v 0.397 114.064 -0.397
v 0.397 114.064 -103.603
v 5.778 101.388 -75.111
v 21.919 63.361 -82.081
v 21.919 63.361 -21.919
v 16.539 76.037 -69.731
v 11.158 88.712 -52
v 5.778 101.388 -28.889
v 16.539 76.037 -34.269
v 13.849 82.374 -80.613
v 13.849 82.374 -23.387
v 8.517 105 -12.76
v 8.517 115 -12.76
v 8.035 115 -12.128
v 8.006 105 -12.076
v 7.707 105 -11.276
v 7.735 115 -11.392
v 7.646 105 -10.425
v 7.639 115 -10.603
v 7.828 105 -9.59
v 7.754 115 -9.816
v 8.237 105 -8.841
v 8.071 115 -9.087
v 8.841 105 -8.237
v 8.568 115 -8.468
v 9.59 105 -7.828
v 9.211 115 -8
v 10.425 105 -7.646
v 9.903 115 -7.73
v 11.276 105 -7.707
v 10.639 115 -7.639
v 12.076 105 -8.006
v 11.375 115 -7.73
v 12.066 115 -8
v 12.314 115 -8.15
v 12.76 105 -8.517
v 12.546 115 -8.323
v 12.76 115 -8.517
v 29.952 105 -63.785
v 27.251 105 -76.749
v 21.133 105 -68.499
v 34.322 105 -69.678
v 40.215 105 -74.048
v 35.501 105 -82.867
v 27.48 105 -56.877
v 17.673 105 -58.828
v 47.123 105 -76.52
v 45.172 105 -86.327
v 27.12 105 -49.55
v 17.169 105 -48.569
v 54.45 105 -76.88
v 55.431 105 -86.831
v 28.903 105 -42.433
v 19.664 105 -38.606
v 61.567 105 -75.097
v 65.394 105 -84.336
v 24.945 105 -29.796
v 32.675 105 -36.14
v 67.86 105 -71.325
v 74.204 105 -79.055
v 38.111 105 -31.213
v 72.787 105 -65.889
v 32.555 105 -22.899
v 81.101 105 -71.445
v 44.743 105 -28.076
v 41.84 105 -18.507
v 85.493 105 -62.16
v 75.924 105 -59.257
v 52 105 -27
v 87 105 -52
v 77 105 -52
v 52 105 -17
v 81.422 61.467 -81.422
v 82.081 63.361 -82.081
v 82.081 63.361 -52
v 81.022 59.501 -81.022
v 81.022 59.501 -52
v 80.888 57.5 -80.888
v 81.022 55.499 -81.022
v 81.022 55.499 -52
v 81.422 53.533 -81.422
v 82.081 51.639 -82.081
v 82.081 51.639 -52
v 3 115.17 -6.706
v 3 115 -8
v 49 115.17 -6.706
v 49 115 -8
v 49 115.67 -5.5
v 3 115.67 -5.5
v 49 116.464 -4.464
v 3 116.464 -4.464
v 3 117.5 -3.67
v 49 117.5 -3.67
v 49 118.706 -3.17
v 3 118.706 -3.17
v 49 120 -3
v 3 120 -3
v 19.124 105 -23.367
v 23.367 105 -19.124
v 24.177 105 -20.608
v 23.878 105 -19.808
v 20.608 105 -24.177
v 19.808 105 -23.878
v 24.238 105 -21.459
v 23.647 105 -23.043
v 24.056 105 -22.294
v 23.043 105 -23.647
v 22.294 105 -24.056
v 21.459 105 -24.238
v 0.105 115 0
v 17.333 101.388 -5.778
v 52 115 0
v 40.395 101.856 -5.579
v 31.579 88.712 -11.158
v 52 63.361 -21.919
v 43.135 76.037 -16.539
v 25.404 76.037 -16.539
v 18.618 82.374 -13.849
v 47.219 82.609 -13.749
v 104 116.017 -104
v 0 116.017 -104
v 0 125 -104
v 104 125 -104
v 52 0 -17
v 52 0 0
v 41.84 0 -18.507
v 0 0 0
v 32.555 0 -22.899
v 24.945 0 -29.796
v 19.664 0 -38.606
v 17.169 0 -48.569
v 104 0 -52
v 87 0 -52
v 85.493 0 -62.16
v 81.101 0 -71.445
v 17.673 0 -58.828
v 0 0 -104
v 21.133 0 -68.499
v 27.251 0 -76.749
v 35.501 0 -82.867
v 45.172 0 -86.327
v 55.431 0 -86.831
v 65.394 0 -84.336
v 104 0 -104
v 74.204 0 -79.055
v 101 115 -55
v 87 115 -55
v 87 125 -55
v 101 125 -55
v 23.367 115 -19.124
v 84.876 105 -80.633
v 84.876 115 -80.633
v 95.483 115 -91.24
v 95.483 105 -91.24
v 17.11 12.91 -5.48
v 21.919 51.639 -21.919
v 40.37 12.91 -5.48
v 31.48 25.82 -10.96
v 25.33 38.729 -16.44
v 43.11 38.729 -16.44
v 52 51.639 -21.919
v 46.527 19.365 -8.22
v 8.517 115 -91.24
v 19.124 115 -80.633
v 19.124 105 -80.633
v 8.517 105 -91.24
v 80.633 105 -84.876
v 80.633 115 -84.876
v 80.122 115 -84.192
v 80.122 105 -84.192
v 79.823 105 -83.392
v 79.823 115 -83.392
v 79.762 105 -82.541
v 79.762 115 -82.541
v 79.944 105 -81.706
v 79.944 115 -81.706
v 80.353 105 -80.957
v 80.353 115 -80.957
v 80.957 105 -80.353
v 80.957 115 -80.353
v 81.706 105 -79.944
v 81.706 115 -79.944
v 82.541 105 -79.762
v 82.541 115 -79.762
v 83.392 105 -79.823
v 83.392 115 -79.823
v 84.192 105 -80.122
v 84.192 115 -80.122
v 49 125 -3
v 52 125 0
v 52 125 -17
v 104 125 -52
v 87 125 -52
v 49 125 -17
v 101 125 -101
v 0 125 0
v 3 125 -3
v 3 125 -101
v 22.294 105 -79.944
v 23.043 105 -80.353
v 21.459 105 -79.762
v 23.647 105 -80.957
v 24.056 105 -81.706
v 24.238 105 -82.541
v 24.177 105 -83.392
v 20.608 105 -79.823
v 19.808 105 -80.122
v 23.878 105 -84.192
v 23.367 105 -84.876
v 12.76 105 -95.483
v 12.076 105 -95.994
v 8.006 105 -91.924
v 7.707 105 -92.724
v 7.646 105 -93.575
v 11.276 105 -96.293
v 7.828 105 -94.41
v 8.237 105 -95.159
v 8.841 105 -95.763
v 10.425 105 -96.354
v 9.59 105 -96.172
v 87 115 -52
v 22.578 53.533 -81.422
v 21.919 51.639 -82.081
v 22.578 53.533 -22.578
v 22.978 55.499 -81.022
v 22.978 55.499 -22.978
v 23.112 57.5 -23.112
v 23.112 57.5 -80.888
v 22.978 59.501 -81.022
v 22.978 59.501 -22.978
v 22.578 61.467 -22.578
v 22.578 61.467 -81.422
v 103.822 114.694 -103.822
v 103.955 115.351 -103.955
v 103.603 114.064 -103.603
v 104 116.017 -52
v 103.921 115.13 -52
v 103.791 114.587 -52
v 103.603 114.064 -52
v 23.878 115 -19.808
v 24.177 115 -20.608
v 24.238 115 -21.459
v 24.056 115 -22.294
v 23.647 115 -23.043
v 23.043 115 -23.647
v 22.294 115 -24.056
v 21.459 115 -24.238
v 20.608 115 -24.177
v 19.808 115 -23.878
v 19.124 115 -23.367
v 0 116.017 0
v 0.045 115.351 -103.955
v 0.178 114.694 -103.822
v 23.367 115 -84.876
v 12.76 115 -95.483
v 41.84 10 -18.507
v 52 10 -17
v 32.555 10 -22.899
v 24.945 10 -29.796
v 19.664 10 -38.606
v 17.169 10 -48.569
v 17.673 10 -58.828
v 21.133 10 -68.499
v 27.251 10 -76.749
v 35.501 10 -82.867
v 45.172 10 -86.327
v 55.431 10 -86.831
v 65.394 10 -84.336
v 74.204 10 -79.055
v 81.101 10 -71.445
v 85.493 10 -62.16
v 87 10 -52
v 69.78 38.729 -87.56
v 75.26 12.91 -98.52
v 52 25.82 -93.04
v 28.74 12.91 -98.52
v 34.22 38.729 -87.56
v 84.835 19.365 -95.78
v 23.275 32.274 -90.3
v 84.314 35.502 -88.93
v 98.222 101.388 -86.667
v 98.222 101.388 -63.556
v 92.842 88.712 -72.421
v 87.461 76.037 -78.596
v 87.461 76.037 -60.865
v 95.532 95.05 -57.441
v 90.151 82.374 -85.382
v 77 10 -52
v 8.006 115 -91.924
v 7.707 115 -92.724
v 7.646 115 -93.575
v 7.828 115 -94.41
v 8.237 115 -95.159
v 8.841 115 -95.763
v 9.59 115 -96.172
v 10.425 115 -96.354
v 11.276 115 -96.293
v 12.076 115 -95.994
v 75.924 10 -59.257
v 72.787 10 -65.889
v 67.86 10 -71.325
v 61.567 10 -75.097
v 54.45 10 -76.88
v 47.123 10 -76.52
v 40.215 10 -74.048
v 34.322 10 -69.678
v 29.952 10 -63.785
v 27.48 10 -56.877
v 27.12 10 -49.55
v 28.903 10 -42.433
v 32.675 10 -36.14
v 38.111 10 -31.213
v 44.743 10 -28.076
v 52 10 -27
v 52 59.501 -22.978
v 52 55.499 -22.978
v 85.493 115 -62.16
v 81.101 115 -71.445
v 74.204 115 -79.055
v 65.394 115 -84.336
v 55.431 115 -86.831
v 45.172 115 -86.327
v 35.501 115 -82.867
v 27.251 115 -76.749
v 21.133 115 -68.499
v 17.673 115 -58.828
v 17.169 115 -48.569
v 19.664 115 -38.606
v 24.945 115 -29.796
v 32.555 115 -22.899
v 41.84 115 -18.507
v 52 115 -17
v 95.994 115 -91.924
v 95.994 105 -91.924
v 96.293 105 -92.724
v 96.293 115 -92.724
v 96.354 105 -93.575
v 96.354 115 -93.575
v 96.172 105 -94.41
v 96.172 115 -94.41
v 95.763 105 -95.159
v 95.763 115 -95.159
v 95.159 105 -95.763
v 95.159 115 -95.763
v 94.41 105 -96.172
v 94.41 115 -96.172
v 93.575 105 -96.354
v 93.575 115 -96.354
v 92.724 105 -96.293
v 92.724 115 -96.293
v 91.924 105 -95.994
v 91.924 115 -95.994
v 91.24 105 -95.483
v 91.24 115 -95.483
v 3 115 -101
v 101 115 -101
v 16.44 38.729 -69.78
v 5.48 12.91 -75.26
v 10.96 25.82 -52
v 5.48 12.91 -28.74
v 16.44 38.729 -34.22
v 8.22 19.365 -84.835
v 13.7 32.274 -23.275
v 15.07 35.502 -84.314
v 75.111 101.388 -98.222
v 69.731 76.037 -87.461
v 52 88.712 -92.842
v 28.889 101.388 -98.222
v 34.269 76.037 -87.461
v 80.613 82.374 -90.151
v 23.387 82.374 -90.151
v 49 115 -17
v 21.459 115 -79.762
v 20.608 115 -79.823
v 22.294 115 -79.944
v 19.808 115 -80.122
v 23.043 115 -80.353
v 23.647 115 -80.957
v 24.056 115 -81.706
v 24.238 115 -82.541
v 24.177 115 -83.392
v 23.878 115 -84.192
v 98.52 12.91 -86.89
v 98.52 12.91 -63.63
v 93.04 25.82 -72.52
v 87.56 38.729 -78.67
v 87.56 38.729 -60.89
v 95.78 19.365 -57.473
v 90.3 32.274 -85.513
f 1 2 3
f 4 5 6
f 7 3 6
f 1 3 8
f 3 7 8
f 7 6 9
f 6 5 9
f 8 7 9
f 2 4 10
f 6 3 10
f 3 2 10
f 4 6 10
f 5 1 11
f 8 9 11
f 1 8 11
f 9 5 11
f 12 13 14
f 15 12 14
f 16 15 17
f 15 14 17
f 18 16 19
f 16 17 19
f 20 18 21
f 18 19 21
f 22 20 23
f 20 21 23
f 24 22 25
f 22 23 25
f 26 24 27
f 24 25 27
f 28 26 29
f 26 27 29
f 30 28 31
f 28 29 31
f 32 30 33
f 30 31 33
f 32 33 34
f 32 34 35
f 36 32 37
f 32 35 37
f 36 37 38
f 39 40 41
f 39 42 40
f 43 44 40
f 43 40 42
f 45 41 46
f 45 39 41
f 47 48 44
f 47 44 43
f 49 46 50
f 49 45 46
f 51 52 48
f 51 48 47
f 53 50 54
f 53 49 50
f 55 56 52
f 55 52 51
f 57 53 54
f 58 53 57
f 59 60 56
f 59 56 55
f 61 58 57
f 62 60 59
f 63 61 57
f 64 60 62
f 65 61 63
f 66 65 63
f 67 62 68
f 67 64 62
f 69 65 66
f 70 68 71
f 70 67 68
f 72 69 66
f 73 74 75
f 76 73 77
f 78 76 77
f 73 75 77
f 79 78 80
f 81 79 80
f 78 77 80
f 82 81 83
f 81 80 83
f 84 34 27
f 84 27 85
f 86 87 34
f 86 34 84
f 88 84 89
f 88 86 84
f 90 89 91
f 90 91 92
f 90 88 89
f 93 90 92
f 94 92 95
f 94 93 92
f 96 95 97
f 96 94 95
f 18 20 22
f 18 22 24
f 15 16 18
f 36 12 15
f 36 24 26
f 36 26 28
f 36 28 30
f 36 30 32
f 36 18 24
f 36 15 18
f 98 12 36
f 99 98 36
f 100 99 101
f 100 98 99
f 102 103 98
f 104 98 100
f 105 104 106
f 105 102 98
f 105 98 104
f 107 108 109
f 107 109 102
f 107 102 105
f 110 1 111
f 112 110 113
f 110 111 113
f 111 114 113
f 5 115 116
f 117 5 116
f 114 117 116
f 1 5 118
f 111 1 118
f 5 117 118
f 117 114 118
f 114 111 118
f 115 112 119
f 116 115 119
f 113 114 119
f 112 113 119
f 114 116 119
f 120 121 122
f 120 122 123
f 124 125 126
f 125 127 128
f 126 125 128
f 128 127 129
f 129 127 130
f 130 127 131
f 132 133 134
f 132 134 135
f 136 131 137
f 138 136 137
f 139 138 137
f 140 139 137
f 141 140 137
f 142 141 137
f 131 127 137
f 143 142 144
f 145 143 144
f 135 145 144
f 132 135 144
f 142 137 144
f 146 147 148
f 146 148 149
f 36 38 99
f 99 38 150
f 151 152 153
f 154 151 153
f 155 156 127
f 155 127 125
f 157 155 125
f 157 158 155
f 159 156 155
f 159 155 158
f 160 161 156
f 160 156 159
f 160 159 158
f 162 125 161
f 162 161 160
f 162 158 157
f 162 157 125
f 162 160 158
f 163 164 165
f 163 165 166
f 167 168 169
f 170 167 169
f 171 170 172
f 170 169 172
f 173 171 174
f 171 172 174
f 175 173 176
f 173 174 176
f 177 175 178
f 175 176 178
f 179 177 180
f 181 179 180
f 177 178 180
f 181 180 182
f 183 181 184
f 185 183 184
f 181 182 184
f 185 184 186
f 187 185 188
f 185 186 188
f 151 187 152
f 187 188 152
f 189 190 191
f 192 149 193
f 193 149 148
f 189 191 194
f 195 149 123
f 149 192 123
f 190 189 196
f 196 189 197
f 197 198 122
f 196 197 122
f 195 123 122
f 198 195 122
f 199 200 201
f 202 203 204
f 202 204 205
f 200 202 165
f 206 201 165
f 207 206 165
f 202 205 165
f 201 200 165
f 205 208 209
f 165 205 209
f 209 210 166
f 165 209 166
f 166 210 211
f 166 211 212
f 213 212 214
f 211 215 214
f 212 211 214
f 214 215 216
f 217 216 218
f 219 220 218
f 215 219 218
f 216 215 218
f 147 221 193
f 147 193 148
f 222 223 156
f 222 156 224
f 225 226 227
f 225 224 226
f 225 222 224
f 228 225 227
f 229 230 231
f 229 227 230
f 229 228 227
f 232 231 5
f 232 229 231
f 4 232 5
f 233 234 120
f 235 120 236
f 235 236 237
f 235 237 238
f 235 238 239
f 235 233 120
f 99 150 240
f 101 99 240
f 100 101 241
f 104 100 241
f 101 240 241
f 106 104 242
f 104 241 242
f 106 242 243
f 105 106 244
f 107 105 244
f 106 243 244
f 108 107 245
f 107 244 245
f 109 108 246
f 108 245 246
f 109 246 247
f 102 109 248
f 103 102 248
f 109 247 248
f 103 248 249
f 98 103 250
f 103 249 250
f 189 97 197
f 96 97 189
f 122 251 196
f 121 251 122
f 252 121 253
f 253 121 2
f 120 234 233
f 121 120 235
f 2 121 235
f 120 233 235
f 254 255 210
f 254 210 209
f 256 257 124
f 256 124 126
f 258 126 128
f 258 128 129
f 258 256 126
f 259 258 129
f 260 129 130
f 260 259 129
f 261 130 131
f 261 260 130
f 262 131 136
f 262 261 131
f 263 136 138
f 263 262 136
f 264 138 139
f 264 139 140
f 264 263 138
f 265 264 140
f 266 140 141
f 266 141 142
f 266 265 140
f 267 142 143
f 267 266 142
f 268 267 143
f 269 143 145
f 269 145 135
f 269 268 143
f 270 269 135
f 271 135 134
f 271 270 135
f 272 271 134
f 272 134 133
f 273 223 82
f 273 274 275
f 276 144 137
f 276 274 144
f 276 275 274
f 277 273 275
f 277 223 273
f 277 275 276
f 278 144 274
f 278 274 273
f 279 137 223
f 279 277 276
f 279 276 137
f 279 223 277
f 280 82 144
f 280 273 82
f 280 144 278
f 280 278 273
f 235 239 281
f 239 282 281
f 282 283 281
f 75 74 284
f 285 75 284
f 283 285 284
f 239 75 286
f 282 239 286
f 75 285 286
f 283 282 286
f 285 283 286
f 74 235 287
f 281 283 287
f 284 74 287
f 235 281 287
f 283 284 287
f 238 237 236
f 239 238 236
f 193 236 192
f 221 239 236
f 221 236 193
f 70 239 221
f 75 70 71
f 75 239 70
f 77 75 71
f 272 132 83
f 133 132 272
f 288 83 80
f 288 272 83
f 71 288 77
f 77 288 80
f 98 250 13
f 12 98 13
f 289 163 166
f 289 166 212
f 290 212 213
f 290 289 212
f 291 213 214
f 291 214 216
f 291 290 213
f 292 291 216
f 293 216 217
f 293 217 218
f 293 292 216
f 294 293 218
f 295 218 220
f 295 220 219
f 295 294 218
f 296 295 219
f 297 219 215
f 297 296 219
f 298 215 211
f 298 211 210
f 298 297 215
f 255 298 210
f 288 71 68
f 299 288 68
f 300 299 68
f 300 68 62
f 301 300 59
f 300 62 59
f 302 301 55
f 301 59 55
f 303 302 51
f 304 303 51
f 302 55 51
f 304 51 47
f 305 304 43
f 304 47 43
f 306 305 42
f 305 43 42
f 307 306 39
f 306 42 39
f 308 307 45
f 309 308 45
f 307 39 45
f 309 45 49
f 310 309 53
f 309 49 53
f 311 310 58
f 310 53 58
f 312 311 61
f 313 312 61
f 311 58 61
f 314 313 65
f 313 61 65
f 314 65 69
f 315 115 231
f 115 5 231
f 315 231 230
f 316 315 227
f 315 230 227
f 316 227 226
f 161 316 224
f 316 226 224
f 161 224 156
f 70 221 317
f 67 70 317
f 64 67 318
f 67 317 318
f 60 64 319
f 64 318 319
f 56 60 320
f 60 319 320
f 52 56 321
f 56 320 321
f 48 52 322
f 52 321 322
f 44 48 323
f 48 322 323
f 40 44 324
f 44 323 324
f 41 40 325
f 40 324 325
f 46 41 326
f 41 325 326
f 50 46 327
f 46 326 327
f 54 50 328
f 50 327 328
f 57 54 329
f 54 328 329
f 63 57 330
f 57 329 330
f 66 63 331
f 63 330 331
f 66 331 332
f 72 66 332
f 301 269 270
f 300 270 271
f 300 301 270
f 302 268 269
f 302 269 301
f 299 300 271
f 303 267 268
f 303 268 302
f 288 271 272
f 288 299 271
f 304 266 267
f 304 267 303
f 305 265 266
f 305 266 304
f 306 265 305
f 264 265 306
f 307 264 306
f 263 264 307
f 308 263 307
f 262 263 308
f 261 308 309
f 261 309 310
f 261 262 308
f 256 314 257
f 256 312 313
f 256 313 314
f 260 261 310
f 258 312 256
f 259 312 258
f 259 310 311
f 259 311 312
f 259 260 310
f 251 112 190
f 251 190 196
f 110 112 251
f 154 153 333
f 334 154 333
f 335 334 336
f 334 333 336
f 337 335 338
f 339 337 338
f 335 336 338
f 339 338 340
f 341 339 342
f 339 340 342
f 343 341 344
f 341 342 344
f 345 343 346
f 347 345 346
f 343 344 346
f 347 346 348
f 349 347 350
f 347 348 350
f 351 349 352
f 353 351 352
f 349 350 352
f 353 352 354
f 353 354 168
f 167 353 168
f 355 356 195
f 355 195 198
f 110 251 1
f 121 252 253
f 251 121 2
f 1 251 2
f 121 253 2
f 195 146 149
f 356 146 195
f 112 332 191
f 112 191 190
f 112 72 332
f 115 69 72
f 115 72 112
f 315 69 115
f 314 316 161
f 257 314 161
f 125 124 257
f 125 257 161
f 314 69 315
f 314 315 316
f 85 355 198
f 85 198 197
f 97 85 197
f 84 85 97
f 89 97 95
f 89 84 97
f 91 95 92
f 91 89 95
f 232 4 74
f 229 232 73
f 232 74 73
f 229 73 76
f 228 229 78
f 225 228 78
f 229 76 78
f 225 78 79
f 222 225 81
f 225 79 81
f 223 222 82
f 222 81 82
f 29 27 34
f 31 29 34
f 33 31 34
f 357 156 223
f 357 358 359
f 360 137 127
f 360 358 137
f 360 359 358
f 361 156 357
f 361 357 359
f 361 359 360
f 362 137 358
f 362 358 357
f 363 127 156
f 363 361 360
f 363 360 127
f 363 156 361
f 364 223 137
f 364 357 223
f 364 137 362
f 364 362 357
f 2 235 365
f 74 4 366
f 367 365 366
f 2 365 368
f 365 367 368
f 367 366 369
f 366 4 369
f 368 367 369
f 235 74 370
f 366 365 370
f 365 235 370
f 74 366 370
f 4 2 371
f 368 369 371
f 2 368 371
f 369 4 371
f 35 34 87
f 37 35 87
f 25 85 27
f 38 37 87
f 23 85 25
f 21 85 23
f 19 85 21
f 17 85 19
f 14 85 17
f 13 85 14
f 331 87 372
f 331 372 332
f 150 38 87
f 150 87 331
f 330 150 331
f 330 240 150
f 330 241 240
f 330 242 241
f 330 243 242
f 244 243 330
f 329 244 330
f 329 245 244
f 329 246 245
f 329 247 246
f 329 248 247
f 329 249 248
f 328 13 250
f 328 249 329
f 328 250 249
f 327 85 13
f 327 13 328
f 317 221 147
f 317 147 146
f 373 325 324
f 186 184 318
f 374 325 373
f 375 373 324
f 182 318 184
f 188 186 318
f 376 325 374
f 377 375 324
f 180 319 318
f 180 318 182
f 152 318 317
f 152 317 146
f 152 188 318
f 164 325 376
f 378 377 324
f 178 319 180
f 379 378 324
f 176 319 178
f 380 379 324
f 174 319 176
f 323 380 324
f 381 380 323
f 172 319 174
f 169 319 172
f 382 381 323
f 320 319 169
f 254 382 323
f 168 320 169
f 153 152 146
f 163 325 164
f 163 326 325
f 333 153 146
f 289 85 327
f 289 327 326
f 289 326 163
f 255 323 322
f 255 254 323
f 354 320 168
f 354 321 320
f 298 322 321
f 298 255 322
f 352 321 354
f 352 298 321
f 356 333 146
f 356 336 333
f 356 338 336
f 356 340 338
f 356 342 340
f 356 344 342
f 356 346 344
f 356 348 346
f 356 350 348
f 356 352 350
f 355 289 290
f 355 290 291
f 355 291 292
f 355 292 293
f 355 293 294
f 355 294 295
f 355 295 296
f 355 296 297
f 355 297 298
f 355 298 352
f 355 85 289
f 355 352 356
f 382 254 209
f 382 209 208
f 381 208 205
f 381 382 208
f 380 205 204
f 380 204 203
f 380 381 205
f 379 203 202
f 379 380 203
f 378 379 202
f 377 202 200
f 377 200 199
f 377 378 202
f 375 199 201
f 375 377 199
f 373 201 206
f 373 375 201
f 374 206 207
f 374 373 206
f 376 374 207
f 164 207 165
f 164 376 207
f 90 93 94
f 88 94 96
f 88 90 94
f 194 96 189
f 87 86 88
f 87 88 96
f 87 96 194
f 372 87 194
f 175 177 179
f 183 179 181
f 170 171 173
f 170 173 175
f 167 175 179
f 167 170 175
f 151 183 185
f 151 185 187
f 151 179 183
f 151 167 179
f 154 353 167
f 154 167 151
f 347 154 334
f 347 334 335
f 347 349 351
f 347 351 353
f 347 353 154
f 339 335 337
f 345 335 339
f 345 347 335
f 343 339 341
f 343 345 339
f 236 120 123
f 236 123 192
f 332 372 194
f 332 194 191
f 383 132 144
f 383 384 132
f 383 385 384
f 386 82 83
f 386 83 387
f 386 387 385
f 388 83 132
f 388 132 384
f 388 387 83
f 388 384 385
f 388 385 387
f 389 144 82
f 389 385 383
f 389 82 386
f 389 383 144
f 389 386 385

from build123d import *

# Parameters (mm, degrees)
SKETCH1_W           = 104
SKETCH1_H           = 104
BOSS_EXTRUDE1_DEPTH = 57.5
BOSS_EXTRUDE1_TAPER = 23
SKETCH2_R           = 25
CUT_EXTRUDE1_DEPTH  = 187.700294763
FILLET1_R           = 15
SKETCH3_R           = 35
CUT_EXTRUDE2_DEPTH  = 10
CUT_EXTRUDE3_START  = -10
SKETCH5_R           = 35
CUT_EXTRUDE3_DEPTH  = 10
SKETCH6_W           = 52
SKETCH6_H           = 52
CUT_EXTRUDE4_DEPTH  = 187.700294763
BOSS_EXTRUDE2_DEPTH = 10
FILLET2_R           = 5
CUT_EXTRUDE5_DEPTH  = 10


with BuildPart() as part:
    # Sketch1 → Boss-Extrude1 (new body)
    with BuildSketch(Plane(origin=(0, 0, 0), x_dir=(1, 0, 0), z_dir=(0, 1, 0))):
        with Locations((52, 52)):
            Rectangle(SKETCH1_W, SKETCH1_H)
    extrude(amount=BOSS_EXTRUDE1_DEPTH, taper=BOSS_EXTRUDE1_TAPER)

    # Mirror1: part across plane


with BuildPart() as part_1:
    add(part.part)
    add(part.part.mirror(Plane(origin=(0, 57.5, 0), x_dir=(0, 0, 1), z_dir=(0, -1, 0))))

    # Sketch2 → Cut-Extrude1 (cut, through all)
    with BuildSketch(Plane(origin=(0, 115, 0), x_dir=(1, 0, 0), z_dir=(0, 1, 0))):
        with Locations(Location((52, 52, 0), (0, 0, 270))):
            Circle(SKETCH2_R)
    extrude(amount=-CUT_EXTRUDE1_DEPTH, mode=Mode.SUBTRACT)

    # Fillet1
    # the kernel refuses this fillet: 15 mm, written as the material it adds along each edge
    with BuildSketch(Plane(origin=(24.407301932, 57.5, -95.510503676), x_dir=(-0.39073112848927455, -0.9205048534524399, 0), z_dir=(0, 0, 1))) as fillet1_piece_1_section:
        with BuildLine():
            CenterArc((FILLET1_R * 0.42447481621, -FILLET1_R), FILLET1_R, 90, 46)
            Line((-FILLET1_R * 0.294864984129, -FILLET1_R * 0.305341629541), (0, 0))
            Line((0, 0), (FILLET1_R * 0.42447481621, 0))
        make_face()
    fillet1_piece_1 = extrude(amount=87.021007352, mode=Mode.PRIVATE)
    fillet1_piece_1 = fillet1_piece_1 - Plane(origin=(24.407301932, 57.5, -8.111896271), x_dir=(0, -0.39073112848927466, -0.9205048534524399), z_dir=(-1, 0, 0)) * Cylinder(15, 200, mode=Mode.PRIVATE)
    fillet1_piece_1 = fillet1_piece_1 - Plane(origin=(24.407301932, 57.5, -95.888103729), x_dir=(0, -0.3907311284892748, 0.9205048534524398), z_dir=(1, 0, 0)) * Cylinder(15, 200, mode=Mode.PRIVATE)
    add(fillet1_piece_1)
    with BuildSketch(Plane(origin=(8.489496324, 57.5, -24.407301932), x_dir=(0, -0.9205048534524399, 0.39073112848927455), z_dir=(1, 0, 0))) as fillet1_piece_2_section:
        with BuildLine():
            CenterArc((FILLET1_R * 0.42447481621, -FILLET1_R), FILLET1_R, 90, 46)
            Line((-FILLET1_R * 0.294864984129, -FILLET1_R * 0.305341629541), (0, 0))
            Line((0, 0), (FILLET1_R * 0.42447481621, 0))
        make_face()
    fillet1_piece_2 = extrude(amount=87.021007352, mode=Mode.PRIVATE)
    fillet1_piece_2 = fillet1_piece_2 - Plane(origin=(95.888103729, 57.5, -24.407301932), x_dir=(-0.9205048534524398, -0.3907311284892748, 0), z_dir=(0, 0, 1)) * Cylinder(15, 200, mode=Mode.PRIVATE)
    fillet1_piece_2 = fillet1_piece_2 - Plane(origin=(8.111896271, 57.5, -24.407301932), x_dir=(0.9205048534524399, -0.39073112848927466, 0), z_dir=(0, 0, -1)) * Cylinder(15, 200, mode=Mode.PRIVATE)
    add(fillet1_piece_2)
    with BuildSketch(Plane(origin=(79.592698068, 57.5, -8.489496324), x_dir=(0.39073112848927455, -0.9205048534524399, 0), z_dir=(0, 0, -1))) as fillet1_piece_3_section:
        with BuildLine():
            CenterArc((FILLET1_R * 0.42447481621, -FILLET1_R), FILLET1_R, 90, 46)
            Line((-FILLET1_R * 0.294864984129, -FILLET1_R * 0.305341629541), (0, 0))
            Line((0, 0), (FILLET1_R * 0.42447481621, 0))
        make_face()
    fillet1_piece_3 = extrude(amount=87.021007352, mode=Mode.PRIVATE)
    fillet1_piece_3 = fillet1_piece_3 - Plane(origin=(79.592698068, 57.5, -8.111896271), x_dir=(0, -0.39073112848927466, -0.9205048534524399), z_dir=(-1, 0, 0)) * Cylinder(15, 200, mode=Mode.PRIVATE)
    fillet1_piece_3 = fillet1_piece_3 - Plane(origin=(79.592698068, 57.5, -95.888103729), x_dir=(0, -0.3907311284892748, 0.9205048534524398), z_dir=(1, 0, 0)) * Cylinder(15, 200, mode=Mode.PRIVATE)
    add(fillet1_piece_3)
    with BuildSketch(Plane(origin=(95.510503676, 57.5, -79.592698068), x_dir=(0, -0.9205048534524399, -0.39073112848927455), z_dir=(-1, 0, 0))) as fillet1_piece_4_section:
        with BuildLine():
            CenterArc((FILLET1_R * 0.42447481621, -FILLET1_R), FILLET1_R, 90, 46)
            Line((-FILLET1_R * 0.294864984129, -FILLET1_R * 0.305341629541), (0, 0))
            Line((0, 0), (FILLET1_R * 0.42447481621, 0))
        make_face()
    fillet1_piece_4 = extrude(amount=87.021007352, mode=Mode.PRIVATE)
    fillet1_piece_4 = fillet1_piece_4 - Plane(origin=(95.888103729, 57.5, -79.592698068), x_dir=(-0.9205048534524398, -0.3907311284892748, 0), z_dir=(0, 0, 1)) * Cylinder(15, 200, mode=Mode.PRIVATE)
    fillet1_piece_4 = fillet1_piece_4 - Plane(origin=(8.111896271, 57.5, -79.592698068), x_dir=(0.9205048534524399, -0.39073112848927466, 0), z_dir=(0, 0, -1)) * Cylinder(15, 200, mode=Mode.PRIVATE)
    add(fillet1_piece_4)

    # Sketch3 → Cut-Extrude2 (cut)
    with BuildSketch(Plane(origin=(0, 115, 0), x_dir=(1, 0, 0), z_dir=(0, 1, 0))):
        with Locations(Location((52, 52, 0), (0, 0, 270))):
            Circle(SKETCH3_R)
    extrude(amount=-CUT_EXTRUDE2_DEPTH, mode=Mode.SUBTRACT)

    # Sketch5 → Cut-Extrude3 (cut)
    with BuildSketch(Plane.XZ.offset(CUT_EXTRUDE3_START)):
        with Locations(Location((52, -52, 0), (0, 0, 90))):
            Circle(SKETCH5_R)
    extrude(amount=CUT_EXTRUDE3_DEPTH, mode=Mode.SUBTRACT)

    # Sketch6 → Cut-Extrude4 (cut, through all)
    with BuildSketch(Plane(origin=(0, 115, 0), x_dir=(1, 0, 0), z_dir=(0, 1, 0))):
        with Locations((78, 26)):
            Rectangle(SKETCH6_W, SKETCH6_H)
    extrude(amount=-CUT_EXTRUDE4_DEPTH, mode=Mode.SUBTRACT)

    # Sketch7 → Boss-Extrude2 (add)
    with BuildSketch(Plane(origin=(0, 115, 0), x_dir=(1, 0, 0), z_dir=(0, 1, 0))):
        Polygon((52, 17), (52, 0), (0, 0), (0, 104), (104, 104), (104, 52), (87, 52), (87, 55), (101, 55), (101, 101), (3, 101), (3, 3), (49, 3), (49, 17), align=None)
    extrude(amount=BOSS_EXTRUDE2_DEPTH)

    # Fillet2
    fillet2_edges = [part_1.edges().sort_by_distance(p)[0] for p in [
        (26, 115, -3),
        (0, 115, -52),
        (52, 115, -104),
        (104, 115, -78),
    ]]
    fillet(fillet2_edges, radius=FILLET2_R)

    # Sketch8 → Cut-Extrude5 (cut)
    with BuildSketch(Plane(origin=(0, 115, 0), x_dir=(1, 0, 0), z_dir=(0, 1, 0))):
        with BuildLine():
            Line((12.760046787, 95.4825939), (23.366648505, 84.875992182))
            ThreePointArc((23.366648505, 84.875992182), (23.366648505, 80.633351495), (19.124007818, 80.633351495))
            Line((19.124007818, 80.633351495), (8.5174061, 91.239953213))
            ThreePointArc((8.5174061, 91.239953213), (8.5174061, 95.4825939), (12.760046787, 95.4825939))
        make_face()
        with BuildLine():
            Line((12.760046787, 8.5174061), (23.366648505, 19.124007818))
            ThreePointArc((23.366648505, 19.124007818), (23.366648505, 23.366648505), (19.124007818, 23.366648505))
            Line((19.124007818, 23.366648505), (8.5174061, 12.760046787))
            ThreePointArc((8.5174061, 12.760046787), (8.5174061, 8.5174061), (12.760046787, 8.5174061))
        make_face()
        with BuildLine():
            Line((91.239953213, 95.4825939), (80.633351495, 84.875992182))
            ThreePointArc((80.633351495, 84.875992182), (80.633351495, 80.633351495), (84.875992182, 80.633351495))
            Line((84.875992182, 80.633351495), (95.4825939, 91.239953213))
            ThreePointArc((95.4825939, 91.239953213), (95.4825939, 95.4825939), (91.239953213, 95.4825939))
        make_face()
    extrude(amount=-CUT_EXTRUDE5_DEPTH, mode=Mode.SUBTRACT)


solid = part_1.part
